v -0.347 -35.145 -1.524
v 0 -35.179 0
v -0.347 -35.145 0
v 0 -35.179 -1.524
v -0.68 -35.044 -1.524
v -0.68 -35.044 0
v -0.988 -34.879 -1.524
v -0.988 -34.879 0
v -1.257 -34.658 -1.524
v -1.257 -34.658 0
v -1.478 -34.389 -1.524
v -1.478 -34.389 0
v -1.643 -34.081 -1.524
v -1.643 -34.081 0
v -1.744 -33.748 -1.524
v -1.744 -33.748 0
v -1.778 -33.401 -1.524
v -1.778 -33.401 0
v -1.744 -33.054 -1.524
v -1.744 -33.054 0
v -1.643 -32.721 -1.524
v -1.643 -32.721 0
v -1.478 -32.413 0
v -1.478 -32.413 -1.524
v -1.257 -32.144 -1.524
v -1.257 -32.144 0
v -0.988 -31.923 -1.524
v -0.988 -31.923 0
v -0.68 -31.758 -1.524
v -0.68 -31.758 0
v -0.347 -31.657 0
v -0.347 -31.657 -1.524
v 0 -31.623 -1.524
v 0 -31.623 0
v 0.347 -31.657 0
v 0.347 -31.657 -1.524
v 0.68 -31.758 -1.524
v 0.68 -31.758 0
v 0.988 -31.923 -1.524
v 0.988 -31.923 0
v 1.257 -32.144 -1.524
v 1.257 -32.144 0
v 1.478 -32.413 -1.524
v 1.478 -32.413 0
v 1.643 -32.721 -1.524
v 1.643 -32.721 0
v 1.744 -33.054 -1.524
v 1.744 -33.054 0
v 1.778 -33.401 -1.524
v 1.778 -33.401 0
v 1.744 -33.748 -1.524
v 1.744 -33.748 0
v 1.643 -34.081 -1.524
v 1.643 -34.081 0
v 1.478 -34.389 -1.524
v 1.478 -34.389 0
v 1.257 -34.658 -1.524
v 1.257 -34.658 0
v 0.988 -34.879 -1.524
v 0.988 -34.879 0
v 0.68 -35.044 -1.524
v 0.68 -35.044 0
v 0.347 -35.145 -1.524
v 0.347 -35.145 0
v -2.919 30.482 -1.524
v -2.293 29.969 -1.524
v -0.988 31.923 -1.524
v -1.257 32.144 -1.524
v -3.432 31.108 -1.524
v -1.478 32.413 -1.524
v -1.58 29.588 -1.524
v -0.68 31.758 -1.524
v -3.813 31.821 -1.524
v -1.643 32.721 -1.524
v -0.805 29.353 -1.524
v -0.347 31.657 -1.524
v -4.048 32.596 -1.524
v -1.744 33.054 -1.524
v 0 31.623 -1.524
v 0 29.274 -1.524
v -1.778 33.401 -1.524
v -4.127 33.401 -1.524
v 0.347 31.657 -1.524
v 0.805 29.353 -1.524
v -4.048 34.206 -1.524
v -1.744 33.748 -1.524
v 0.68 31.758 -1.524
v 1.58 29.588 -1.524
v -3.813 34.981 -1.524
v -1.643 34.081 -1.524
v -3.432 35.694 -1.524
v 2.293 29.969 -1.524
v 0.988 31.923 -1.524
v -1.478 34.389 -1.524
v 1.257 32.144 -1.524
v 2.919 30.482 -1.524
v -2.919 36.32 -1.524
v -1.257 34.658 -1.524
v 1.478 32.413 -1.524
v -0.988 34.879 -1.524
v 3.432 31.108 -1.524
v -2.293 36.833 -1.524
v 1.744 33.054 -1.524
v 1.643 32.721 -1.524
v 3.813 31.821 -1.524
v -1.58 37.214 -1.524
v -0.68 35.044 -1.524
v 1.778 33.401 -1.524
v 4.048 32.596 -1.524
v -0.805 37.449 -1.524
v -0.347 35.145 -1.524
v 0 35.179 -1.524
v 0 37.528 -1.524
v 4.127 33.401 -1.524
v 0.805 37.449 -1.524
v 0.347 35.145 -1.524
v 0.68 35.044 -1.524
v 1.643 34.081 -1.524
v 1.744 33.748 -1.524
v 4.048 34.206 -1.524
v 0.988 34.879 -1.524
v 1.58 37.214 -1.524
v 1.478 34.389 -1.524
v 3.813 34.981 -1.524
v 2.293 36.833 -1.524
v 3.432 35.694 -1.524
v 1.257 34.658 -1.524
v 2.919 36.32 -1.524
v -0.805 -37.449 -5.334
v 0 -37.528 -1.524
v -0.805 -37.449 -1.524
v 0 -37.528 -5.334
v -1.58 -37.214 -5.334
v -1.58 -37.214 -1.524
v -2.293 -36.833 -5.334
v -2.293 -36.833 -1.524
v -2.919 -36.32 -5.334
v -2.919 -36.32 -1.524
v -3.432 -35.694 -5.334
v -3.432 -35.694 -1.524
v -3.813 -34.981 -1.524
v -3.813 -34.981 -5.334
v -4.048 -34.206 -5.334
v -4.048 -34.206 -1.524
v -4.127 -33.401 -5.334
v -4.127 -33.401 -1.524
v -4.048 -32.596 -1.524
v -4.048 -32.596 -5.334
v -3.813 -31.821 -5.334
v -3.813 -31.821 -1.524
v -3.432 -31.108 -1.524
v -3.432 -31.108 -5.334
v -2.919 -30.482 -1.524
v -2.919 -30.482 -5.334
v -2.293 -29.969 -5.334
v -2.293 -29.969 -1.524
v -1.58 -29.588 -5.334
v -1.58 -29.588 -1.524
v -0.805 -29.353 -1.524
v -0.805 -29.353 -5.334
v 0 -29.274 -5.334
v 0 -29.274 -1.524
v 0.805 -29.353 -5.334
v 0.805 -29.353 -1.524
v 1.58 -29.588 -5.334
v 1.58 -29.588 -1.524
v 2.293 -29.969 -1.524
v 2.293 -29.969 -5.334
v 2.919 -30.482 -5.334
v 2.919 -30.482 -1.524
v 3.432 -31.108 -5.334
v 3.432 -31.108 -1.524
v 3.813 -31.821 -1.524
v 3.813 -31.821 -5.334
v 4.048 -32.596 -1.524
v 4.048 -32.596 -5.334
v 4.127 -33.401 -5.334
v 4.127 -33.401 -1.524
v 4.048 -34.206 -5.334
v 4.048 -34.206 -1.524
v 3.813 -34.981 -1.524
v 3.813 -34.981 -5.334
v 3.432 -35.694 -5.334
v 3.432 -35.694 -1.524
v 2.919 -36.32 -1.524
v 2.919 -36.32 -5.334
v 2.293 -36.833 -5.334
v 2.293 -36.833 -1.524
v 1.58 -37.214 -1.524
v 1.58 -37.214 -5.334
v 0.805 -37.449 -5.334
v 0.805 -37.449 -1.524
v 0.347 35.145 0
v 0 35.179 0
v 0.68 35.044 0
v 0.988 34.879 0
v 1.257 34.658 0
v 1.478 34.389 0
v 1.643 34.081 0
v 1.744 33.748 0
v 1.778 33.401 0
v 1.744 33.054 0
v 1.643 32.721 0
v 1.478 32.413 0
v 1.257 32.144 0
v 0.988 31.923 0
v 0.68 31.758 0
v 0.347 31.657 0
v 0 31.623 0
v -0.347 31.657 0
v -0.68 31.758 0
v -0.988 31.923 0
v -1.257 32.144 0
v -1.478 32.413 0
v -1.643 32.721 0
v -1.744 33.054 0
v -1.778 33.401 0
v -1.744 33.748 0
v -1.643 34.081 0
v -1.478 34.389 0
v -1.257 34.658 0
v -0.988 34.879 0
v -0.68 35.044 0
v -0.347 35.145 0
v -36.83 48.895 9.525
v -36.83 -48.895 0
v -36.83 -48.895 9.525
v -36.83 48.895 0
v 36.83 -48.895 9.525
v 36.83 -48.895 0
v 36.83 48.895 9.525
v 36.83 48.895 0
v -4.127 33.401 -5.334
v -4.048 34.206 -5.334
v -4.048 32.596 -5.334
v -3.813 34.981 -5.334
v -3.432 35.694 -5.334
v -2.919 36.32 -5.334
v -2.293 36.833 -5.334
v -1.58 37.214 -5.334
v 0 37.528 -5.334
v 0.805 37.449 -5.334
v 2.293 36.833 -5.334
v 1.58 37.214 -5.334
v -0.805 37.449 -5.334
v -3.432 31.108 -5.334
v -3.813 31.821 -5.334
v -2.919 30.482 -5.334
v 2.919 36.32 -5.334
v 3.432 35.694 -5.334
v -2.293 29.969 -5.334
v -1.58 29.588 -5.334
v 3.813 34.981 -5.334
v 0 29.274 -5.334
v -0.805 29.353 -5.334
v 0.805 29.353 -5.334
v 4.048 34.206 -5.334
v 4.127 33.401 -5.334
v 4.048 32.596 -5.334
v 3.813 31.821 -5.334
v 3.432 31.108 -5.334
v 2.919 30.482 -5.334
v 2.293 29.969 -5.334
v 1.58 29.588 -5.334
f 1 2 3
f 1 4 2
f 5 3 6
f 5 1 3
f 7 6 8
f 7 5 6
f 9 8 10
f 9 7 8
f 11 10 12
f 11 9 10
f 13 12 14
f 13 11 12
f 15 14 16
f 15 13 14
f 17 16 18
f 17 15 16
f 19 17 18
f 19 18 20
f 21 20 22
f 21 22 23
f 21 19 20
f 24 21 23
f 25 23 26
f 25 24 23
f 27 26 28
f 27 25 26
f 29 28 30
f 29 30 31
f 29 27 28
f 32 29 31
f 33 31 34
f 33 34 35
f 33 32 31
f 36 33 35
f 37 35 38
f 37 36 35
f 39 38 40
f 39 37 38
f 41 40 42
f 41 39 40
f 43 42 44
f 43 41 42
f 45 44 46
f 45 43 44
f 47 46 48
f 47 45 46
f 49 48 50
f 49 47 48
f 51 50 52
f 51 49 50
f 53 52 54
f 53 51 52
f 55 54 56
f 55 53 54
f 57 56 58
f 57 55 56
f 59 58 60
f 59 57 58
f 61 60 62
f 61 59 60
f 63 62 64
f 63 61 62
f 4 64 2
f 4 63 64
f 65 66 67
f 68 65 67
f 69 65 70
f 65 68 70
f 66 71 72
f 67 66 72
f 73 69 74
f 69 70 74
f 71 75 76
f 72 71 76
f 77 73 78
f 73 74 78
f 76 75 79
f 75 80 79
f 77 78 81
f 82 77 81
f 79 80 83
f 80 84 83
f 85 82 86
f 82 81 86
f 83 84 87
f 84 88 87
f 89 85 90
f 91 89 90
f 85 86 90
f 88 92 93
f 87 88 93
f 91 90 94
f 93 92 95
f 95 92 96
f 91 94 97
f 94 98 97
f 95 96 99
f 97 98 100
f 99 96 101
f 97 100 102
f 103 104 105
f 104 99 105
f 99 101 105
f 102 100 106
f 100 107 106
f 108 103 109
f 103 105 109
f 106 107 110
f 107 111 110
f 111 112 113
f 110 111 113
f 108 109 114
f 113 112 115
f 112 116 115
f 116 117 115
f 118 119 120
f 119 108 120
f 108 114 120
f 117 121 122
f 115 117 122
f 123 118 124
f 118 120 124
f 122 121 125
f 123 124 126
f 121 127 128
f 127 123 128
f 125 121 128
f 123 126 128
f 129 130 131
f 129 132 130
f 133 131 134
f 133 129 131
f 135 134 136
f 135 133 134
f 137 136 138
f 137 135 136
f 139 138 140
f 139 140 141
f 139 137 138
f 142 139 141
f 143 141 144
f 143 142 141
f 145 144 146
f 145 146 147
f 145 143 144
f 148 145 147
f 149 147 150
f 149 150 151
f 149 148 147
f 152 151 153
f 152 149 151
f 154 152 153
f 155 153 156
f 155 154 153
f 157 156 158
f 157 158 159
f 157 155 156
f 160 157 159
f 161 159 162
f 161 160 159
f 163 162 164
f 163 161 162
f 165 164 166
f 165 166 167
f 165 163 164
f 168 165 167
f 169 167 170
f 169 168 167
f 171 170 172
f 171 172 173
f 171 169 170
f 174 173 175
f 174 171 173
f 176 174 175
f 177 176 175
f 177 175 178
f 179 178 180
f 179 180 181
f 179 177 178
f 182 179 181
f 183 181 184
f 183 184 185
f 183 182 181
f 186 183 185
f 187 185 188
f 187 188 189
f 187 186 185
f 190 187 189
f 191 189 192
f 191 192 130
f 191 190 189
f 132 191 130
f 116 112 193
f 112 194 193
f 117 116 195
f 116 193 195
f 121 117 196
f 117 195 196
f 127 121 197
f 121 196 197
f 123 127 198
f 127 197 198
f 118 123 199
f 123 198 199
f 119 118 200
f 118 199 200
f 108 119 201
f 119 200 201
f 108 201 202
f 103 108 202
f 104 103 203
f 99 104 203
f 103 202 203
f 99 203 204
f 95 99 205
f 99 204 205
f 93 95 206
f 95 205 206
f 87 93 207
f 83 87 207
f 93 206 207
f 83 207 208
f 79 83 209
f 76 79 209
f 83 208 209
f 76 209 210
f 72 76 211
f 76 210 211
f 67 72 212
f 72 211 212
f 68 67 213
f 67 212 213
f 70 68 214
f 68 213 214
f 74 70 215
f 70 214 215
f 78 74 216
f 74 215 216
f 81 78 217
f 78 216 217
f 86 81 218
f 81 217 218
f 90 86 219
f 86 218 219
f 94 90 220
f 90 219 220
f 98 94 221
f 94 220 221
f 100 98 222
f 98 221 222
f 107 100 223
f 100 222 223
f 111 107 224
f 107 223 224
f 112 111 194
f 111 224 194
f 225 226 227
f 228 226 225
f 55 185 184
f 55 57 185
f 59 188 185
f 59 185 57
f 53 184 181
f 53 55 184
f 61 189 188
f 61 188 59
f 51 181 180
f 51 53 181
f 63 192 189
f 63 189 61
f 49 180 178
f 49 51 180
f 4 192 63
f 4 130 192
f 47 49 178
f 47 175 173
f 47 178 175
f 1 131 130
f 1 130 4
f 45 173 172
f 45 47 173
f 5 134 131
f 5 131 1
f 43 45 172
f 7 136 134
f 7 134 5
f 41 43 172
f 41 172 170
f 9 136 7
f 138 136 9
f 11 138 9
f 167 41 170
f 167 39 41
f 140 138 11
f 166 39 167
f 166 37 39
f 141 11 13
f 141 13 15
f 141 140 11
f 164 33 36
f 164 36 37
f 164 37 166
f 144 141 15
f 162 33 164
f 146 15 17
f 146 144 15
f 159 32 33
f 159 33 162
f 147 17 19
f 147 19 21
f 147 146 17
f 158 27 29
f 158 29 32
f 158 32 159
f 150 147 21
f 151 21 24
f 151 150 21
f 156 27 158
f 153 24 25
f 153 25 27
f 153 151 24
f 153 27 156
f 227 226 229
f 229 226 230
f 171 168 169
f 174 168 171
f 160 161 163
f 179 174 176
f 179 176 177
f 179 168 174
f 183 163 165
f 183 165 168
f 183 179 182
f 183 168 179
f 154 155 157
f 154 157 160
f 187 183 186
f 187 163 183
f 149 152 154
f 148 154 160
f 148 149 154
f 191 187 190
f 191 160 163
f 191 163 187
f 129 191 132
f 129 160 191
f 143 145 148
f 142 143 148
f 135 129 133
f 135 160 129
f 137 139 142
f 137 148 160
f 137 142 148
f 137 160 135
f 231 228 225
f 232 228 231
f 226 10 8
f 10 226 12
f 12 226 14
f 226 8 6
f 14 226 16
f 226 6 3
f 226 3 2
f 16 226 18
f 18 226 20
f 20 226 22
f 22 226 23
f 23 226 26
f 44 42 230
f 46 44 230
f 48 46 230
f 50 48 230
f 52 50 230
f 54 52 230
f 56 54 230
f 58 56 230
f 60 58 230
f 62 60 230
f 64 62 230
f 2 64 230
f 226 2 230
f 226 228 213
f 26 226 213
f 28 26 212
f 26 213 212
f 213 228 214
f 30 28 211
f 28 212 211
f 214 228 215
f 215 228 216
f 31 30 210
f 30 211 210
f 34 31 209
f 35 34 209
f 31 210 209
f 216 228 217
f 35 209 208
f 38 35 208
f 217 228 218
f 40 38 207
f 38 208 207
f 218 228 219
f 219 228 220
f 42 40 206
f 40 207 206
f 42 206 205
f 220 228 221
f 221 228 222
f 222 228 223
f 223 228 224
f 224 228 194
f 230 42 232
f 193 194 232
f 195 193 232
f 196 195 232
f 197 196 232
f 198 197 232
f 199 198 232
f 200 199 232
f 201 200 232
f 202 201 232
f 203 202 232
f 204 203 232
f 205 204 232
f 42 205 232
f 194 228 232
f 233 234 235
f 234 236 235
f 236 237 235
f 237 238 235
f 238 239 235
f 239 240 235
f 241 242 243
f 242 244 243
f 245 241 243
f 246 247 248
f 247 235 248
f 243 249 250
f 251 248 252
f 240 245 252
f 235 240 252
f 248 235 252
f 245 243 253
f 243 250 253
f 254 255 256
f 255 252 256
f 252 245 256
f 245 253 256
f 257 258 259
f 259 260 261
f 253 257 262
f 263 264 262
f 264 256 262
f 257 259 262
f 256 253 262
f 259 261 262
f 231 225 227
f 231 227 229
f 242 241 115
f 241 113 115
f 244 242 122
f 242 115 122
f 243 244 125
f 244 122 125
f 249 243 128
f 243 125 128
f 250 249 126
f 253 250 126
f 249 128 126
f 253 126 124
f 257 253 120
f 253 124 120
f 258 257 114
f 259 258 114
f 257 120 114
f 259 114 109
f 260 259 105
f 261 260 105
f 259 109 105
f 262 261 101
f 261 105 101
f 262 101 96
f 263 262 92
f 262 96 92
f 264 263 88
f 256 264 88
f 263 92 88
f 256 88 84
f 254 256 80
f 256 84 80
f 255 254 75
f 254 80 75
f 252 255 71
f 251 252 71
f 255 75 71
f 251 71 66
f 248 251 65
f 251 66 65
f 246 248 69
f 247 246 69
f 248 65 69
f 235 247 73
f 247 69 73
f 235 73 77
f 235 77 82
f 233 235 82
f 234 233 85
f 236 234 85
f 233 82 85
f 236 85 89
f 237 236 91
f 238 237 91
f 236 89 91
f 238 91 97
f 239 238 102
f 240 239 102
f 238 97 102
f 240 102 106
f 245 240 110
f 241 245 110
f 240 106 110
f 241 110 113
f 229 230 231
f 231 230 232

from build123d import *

# Parameters (mm, degrees)
F0_W     = 73.66
F0_H     = 97.79
F1_DEPTH = 9.525


# Not quite as in the source:
# - a length typed as a fraction of an inch, garbled in the dataset ("3 / 203.2 mm" for 3/8 in), is restored


with BuildPart() as f1:
    # F0 (on Top) → F1 (new body)
    with BuildSketch(Plane.XY):
        Rectangle(F0_W, F0_H)
    extrude(amount=F1_DEPTH)

    # F2 (on Right) → F3 (revolve)
    with BuildSketch(Plane.YZ):
        Polygon((35.179, 0), (33.401, 0), (33.401, -5.334), (37.5285, -5.334), (37.5285, -1.524), (35.179, -1.524), align=None)
    revolve(axis=Axis((0, 33.401, -2.667), (0, 0, -1)))

    # F2 (on Right) → F4 (revolve)
    with BuildSketch(Plane.YZ):
        Polygon((-33.401, 0), (-35.179, 0), (-35.179, -1.524), (-37.5285, -1.524), (-37.5285, -5.334), (-33.401, -5.334), align=None)
    revolve(axis=Axis((0, -33.401, -2.667), (0, 0, -1)))


solid = f1.part
